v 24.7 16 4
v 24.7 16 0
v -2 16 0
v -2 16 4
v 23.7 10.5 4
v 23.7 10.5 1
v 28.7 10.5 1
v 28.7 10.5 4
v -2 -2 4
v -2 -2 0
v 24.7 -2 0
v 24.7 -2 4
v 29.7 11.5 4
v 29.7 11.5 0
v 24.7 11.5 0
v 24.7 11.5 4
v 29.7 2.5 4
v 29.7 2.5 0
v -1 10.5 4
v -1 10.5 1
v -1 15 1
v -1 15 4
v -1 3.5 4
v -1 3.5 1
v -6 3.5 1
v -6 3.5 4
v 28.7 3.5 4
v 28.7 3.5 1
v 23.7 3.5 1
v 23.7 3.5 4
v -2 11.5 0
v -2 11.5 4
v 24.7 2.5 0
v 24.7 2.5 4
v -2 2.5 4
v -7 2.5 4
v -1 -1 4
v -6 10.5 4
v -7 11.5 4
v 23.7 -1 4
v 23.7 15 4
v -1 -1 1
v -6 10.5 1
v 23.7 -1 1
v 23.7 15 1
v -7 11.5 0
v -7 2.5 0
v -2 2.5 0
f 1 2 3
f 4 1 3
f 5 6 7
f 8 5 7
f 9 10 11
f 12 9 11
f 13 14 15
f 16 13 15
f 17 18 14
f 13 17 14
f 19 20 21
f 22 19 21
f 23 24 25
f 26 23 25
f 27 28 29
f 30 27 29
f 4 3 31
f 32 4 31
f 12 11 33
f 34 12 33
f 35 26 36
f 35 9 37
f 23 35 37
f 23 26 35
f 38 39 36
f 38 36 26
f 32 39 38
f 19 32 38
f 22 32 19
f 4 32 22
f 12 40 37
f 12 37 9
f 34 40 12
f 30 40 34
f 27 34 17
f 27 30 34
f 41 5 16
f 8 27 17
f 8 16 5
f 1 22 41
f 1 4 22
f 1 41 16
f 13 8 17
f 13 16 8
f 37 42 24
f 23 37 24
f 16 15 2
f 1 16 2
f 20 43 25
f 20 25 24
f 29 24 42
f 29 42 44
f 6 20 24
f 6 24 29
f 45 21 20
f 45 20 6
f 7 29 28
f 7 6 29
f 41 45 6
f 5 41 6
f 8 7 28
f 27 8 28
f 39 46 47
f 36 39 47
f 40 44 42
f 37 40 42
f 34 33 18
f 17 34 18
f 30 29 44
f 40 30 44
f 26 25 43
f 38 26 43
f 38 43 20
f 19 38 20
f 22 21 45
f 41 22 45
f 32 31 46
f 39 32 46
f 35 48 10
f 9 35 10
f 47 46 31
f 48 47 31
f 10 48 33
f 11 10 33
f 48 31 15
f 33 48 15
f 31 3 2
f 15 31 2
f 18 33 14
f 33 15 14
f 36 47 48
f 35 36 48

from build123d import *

# Parameters (mm, degrees)
F1_DEPTH = 4
F0_W     = 5
F0_H     = 5
F2_DEPTH = 1


with BuildPart() as f1:
    # F0 (on Top) → F1 (new body)
    with BuildSketch(Plane.XY):
        Polygon((-2, 16), (-2, 11.5), (-7, 11.5), (-7, 2.5), (-2, 2.5), (-2, -2), (24.7, -2), (24.7, 2.5), (29.7, 2.5), (29.7, 11.5), (24.7, 11.5), (24.7, 16), align=None)
        Polygon((-6, 10.5), (-1, 10.5), (-1, 15), (23.7, 15), (23.7, 10.5), (28.7, 10.5), (28.7, 3.5), (23.7, 3.5), (23.7, -1), (-1, -1), (-1, 3.5), (-6, 3.5), align=None, mode=Mode.SUBTRACT)
    extrude(amount=F1_DEPTH)

    # F0 (on Top) → F2 (join)
    with BuildSketch(Plane.XY):
        Polygon((-1, 15), (-1, 10.5), (-6, 10.5), (-6, 3.5), (-1, 3.5), (-1, -1), (23.7, -1), (23.7, 3.5), (28.7, 3.5), (28.7, 10.5), (23.7, 10.5), (23.7, 15), align=None)
        Polygon((22.7, 0), (0, 0), (0, 4.5), (-5, 4.5), (-5, 9.5), (0, 9.5), (0, 14), (22.7, 14), (22.7, 9.5), (27.7, 9.5), (27.7, 4.5), (22.7, 4.5), align=None, mode=Mode.SUBTRACT)
        Polygon((0, 4.5), (0, 0), (22.7, 0), (22.7, 4.5), (22.7, 9.5), (22.7, 14), (0, 14), (0, 9.5), align=None)
        with Locations((-2.5, 7)):
            Rectangle(F0_W, F0_H)
        with Locations((25.2, 7)):
            Rectangle(F0_W, F0_H)
    extrude(amount=F2_DEPTH)


solid = f1.part
